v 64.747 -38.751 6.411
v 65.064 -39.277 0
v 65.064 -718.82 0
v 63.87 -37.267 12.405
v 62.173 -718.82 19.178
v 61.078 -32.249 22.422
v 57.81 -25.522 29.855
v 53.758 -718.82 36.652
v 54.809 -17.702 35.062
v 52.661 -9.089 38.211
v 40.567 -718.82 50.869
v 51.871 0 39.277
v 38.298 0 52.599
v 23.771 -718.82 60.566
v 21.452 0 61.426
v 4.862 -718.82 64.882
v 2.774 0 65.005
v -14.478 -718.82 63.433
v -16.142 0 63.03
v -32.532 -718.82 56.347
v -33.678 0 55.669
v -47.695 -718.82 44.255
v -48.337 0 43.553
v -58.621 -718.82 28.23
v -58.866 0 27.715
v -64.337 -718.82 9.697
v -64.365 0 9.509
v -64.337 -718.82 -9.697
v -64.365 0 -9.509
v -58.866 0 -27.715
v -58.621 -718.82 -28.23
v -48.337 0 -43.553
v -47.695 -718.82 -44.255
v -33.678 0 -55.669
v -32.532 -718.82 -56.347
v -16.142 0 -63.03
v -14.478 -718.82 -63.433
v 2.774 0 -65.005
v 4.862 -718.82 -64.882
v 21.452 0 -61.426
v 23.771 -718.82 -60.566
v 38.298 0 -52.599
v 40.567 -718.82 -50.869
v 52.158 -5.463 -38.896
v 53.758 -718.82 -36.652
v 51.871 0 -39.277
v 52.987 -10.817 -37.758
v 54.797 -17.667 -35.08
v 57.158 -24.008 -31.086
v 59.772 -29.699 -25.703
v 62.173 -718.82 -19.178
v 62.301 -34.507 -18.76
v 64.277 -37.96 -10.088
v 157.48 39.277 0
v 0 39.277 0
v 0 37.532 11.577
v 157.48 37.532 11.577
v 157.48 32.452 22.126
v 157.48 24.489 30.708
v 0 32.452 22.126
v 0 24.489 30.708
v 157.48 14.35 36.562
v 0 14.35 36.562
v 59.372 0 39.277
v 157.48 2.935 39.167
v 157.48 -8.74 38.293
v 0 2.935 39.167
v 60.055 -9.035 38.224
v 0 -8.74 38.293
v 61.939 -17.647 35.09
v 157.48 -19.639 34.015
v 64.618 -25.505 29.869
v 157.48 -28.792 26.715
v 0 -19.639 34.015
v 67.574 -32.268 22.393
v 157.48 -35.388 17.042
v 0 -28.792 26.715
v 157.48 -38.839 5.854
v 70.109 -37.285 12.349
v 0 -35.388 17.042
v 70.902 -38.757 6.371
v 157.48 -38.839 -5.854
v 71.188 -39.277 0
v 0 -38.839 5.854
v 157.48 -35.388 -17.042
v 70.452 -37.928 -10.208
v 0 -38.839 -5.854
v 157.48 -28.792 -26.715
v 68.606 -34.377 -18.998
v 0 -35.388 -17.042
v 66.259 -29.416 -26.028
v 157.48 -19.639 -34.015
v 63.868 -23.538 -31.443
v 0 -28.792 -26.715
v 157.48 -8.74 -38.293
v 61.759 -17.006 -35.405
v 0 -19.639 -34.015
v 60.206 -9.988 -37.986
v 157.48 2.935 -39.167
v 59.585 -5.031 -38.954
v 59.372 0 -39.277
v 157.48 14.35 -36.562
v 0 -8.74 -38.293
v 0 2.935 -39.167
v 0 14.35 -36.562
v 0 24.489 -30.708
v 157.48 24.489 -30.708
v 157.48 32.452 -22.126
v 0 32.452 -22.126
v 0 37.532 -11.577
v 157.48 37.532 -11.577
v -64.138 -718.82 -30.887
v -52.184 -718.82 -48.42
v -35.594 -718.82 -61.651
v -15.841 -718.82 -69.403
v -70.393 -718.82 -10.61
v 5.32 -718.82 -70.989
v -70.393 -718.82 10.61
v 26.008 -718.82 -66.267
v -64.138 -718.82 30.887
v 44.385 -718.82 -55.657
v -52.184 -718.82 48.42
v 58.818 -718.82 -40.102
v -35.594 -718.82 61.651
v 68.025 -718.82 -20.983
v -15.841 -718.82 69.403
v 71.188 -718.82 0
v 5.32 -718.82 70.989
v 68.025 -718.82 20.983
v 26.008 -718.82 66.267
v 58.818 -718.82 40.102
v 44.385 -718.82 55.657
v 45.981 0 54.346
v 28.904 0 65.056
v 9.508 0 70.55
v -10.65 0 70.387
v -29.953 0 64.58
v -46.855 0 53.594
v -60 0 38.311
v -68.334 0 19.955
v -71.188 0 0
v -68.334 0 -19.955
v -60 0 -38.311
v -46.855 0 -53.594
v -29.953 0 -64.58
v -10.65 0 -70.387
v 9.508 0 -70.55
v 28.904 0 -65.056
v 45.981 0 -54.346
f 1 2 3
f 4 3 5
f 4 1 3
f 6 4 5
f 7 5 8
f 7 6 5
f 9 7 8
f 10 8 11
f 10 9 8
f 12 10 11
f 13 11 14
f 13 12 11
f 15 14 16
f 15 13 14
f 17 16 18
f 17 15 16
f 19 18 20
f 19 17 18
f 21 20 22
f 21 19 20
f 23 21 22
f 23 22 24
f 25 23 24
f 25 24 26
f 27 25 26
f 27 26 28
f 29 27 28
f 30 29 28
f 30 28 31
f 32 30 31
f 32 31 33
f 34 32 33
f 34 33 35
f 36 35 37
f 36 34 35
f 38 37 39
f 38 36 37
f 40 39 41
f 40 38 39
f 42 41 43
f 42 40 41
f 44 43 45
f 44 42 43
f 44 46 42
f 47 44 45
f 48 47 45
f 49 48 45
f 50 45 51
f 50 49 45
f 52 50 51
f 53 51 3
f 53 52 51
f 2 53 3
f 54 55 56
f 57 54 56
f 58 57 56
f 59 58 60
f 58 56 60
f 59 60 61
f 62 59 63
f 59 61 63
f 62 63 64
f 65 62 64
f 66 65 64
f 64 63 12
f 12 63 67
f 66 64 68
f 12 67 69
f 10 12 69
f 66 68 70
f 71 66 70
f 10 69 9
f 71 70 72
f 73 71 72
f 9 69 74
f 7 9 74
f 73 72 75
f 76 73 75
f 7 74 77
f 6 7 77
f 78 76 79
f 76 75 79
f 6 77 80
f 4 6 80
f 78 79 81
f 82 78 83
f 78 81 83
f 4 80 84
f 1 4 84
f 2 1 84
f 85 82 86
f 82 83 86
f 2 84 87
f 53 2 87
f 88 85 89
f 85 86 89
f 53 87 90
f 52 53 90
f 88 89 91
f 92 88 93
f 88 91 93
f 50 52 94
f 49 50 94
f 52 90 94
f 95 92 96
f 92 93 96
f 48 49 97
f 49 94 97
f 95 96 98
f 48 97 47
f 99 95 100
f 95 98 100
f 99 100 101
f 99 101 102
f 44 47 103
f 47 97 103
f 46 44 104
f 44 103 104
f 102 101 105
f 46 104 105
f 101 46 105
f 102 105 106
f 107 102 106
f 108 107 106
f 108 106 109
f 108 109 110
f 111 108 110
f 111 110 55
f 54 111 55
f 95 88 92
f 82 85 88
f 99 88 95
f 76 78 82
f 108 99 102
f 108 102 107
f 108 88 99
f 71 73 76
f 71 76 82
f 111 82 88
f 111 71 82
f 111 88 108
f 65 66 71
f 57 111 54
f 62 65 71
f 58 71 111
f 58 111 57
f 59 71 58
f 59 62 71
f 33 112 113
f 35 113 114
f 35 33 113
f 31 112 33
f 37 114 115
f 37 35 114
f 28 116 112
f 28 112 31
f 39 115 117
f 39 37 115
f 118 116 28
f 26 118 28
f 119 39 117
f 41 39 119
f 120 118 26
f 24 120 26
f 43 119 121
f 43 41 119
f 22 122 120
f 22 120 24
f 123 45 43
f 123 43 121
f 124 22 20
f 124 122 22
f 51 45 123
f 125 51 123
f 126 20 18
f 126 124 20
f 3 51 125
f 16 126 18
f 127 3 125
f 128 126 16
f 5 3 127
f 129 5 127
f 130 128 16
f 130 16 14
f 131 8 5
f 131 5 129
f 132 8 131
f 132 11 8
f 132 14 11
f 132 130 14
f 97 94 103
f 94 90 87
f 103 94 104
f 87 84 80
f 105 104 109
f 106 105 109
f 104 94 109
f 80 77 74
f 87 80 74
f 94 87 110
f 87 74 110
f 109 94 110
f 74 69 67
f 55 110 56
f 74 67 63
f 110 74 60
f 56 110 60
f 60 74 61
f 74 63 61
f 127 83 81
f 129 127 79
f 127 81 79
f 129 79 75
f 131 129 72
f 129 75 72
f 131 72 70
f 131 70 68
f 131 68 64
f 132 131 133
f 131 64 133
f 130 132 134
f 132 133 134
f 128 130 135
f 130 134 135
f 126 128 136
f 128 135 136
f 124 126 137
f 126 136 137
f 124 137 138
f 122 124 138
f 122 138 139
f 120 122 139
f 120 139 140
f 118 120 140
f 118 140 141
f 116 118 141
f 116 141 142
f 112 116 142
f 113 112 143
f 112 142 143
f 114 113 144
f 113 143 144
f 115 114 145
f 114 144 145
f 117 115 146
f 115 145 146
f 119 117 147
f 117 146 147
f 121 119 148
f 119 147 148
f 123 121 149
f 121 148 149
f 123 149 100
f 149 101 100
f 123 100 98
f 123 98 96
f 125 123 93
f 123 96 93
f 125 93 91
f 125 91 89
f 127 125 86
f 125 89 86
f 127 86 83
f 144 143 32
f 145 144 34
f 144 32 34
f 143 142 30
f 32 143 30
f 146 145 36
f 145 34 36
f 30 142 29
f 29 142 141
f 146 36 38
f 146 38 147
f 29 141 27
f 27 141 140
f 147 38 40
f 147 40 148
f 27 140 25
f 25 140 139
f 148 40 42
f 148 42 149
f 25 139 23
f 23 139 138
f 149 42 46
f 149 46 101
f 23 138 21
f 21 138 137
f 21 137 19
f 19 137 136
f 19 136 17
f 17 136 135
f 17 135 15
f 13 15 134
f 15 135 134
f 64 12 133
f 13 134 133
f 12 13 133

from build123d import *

# Parameters (mm, degrees)
F0_R     = 71.187924
F0_R_2   = 65.063911
F1_DEPTH = 718.82
F2_R     = 39.27729
F2_R_2   = 26.178049
F3_DEPTH = 157.48


with BuildPart() as f1:
    # F0 (on Front) → F1 (new body)
    with BuildSketch(Plane.XZ):
        Circle(F0_R)
        Circle(F0_R_2, mode=Mode.SUBTRACT)
    extrude(amount=F1_DEPTH)

    # F2 (on Right) → F3 (join)
    with BuildSketch(Plane.YZ):
        Circle(F2_R)
        Circle(F2_R_2, mode=Mode.SUBTRACT)
        Circle(F2_R_2)
    extrude(amount=F3_DEPTH)


solid = f1.part
